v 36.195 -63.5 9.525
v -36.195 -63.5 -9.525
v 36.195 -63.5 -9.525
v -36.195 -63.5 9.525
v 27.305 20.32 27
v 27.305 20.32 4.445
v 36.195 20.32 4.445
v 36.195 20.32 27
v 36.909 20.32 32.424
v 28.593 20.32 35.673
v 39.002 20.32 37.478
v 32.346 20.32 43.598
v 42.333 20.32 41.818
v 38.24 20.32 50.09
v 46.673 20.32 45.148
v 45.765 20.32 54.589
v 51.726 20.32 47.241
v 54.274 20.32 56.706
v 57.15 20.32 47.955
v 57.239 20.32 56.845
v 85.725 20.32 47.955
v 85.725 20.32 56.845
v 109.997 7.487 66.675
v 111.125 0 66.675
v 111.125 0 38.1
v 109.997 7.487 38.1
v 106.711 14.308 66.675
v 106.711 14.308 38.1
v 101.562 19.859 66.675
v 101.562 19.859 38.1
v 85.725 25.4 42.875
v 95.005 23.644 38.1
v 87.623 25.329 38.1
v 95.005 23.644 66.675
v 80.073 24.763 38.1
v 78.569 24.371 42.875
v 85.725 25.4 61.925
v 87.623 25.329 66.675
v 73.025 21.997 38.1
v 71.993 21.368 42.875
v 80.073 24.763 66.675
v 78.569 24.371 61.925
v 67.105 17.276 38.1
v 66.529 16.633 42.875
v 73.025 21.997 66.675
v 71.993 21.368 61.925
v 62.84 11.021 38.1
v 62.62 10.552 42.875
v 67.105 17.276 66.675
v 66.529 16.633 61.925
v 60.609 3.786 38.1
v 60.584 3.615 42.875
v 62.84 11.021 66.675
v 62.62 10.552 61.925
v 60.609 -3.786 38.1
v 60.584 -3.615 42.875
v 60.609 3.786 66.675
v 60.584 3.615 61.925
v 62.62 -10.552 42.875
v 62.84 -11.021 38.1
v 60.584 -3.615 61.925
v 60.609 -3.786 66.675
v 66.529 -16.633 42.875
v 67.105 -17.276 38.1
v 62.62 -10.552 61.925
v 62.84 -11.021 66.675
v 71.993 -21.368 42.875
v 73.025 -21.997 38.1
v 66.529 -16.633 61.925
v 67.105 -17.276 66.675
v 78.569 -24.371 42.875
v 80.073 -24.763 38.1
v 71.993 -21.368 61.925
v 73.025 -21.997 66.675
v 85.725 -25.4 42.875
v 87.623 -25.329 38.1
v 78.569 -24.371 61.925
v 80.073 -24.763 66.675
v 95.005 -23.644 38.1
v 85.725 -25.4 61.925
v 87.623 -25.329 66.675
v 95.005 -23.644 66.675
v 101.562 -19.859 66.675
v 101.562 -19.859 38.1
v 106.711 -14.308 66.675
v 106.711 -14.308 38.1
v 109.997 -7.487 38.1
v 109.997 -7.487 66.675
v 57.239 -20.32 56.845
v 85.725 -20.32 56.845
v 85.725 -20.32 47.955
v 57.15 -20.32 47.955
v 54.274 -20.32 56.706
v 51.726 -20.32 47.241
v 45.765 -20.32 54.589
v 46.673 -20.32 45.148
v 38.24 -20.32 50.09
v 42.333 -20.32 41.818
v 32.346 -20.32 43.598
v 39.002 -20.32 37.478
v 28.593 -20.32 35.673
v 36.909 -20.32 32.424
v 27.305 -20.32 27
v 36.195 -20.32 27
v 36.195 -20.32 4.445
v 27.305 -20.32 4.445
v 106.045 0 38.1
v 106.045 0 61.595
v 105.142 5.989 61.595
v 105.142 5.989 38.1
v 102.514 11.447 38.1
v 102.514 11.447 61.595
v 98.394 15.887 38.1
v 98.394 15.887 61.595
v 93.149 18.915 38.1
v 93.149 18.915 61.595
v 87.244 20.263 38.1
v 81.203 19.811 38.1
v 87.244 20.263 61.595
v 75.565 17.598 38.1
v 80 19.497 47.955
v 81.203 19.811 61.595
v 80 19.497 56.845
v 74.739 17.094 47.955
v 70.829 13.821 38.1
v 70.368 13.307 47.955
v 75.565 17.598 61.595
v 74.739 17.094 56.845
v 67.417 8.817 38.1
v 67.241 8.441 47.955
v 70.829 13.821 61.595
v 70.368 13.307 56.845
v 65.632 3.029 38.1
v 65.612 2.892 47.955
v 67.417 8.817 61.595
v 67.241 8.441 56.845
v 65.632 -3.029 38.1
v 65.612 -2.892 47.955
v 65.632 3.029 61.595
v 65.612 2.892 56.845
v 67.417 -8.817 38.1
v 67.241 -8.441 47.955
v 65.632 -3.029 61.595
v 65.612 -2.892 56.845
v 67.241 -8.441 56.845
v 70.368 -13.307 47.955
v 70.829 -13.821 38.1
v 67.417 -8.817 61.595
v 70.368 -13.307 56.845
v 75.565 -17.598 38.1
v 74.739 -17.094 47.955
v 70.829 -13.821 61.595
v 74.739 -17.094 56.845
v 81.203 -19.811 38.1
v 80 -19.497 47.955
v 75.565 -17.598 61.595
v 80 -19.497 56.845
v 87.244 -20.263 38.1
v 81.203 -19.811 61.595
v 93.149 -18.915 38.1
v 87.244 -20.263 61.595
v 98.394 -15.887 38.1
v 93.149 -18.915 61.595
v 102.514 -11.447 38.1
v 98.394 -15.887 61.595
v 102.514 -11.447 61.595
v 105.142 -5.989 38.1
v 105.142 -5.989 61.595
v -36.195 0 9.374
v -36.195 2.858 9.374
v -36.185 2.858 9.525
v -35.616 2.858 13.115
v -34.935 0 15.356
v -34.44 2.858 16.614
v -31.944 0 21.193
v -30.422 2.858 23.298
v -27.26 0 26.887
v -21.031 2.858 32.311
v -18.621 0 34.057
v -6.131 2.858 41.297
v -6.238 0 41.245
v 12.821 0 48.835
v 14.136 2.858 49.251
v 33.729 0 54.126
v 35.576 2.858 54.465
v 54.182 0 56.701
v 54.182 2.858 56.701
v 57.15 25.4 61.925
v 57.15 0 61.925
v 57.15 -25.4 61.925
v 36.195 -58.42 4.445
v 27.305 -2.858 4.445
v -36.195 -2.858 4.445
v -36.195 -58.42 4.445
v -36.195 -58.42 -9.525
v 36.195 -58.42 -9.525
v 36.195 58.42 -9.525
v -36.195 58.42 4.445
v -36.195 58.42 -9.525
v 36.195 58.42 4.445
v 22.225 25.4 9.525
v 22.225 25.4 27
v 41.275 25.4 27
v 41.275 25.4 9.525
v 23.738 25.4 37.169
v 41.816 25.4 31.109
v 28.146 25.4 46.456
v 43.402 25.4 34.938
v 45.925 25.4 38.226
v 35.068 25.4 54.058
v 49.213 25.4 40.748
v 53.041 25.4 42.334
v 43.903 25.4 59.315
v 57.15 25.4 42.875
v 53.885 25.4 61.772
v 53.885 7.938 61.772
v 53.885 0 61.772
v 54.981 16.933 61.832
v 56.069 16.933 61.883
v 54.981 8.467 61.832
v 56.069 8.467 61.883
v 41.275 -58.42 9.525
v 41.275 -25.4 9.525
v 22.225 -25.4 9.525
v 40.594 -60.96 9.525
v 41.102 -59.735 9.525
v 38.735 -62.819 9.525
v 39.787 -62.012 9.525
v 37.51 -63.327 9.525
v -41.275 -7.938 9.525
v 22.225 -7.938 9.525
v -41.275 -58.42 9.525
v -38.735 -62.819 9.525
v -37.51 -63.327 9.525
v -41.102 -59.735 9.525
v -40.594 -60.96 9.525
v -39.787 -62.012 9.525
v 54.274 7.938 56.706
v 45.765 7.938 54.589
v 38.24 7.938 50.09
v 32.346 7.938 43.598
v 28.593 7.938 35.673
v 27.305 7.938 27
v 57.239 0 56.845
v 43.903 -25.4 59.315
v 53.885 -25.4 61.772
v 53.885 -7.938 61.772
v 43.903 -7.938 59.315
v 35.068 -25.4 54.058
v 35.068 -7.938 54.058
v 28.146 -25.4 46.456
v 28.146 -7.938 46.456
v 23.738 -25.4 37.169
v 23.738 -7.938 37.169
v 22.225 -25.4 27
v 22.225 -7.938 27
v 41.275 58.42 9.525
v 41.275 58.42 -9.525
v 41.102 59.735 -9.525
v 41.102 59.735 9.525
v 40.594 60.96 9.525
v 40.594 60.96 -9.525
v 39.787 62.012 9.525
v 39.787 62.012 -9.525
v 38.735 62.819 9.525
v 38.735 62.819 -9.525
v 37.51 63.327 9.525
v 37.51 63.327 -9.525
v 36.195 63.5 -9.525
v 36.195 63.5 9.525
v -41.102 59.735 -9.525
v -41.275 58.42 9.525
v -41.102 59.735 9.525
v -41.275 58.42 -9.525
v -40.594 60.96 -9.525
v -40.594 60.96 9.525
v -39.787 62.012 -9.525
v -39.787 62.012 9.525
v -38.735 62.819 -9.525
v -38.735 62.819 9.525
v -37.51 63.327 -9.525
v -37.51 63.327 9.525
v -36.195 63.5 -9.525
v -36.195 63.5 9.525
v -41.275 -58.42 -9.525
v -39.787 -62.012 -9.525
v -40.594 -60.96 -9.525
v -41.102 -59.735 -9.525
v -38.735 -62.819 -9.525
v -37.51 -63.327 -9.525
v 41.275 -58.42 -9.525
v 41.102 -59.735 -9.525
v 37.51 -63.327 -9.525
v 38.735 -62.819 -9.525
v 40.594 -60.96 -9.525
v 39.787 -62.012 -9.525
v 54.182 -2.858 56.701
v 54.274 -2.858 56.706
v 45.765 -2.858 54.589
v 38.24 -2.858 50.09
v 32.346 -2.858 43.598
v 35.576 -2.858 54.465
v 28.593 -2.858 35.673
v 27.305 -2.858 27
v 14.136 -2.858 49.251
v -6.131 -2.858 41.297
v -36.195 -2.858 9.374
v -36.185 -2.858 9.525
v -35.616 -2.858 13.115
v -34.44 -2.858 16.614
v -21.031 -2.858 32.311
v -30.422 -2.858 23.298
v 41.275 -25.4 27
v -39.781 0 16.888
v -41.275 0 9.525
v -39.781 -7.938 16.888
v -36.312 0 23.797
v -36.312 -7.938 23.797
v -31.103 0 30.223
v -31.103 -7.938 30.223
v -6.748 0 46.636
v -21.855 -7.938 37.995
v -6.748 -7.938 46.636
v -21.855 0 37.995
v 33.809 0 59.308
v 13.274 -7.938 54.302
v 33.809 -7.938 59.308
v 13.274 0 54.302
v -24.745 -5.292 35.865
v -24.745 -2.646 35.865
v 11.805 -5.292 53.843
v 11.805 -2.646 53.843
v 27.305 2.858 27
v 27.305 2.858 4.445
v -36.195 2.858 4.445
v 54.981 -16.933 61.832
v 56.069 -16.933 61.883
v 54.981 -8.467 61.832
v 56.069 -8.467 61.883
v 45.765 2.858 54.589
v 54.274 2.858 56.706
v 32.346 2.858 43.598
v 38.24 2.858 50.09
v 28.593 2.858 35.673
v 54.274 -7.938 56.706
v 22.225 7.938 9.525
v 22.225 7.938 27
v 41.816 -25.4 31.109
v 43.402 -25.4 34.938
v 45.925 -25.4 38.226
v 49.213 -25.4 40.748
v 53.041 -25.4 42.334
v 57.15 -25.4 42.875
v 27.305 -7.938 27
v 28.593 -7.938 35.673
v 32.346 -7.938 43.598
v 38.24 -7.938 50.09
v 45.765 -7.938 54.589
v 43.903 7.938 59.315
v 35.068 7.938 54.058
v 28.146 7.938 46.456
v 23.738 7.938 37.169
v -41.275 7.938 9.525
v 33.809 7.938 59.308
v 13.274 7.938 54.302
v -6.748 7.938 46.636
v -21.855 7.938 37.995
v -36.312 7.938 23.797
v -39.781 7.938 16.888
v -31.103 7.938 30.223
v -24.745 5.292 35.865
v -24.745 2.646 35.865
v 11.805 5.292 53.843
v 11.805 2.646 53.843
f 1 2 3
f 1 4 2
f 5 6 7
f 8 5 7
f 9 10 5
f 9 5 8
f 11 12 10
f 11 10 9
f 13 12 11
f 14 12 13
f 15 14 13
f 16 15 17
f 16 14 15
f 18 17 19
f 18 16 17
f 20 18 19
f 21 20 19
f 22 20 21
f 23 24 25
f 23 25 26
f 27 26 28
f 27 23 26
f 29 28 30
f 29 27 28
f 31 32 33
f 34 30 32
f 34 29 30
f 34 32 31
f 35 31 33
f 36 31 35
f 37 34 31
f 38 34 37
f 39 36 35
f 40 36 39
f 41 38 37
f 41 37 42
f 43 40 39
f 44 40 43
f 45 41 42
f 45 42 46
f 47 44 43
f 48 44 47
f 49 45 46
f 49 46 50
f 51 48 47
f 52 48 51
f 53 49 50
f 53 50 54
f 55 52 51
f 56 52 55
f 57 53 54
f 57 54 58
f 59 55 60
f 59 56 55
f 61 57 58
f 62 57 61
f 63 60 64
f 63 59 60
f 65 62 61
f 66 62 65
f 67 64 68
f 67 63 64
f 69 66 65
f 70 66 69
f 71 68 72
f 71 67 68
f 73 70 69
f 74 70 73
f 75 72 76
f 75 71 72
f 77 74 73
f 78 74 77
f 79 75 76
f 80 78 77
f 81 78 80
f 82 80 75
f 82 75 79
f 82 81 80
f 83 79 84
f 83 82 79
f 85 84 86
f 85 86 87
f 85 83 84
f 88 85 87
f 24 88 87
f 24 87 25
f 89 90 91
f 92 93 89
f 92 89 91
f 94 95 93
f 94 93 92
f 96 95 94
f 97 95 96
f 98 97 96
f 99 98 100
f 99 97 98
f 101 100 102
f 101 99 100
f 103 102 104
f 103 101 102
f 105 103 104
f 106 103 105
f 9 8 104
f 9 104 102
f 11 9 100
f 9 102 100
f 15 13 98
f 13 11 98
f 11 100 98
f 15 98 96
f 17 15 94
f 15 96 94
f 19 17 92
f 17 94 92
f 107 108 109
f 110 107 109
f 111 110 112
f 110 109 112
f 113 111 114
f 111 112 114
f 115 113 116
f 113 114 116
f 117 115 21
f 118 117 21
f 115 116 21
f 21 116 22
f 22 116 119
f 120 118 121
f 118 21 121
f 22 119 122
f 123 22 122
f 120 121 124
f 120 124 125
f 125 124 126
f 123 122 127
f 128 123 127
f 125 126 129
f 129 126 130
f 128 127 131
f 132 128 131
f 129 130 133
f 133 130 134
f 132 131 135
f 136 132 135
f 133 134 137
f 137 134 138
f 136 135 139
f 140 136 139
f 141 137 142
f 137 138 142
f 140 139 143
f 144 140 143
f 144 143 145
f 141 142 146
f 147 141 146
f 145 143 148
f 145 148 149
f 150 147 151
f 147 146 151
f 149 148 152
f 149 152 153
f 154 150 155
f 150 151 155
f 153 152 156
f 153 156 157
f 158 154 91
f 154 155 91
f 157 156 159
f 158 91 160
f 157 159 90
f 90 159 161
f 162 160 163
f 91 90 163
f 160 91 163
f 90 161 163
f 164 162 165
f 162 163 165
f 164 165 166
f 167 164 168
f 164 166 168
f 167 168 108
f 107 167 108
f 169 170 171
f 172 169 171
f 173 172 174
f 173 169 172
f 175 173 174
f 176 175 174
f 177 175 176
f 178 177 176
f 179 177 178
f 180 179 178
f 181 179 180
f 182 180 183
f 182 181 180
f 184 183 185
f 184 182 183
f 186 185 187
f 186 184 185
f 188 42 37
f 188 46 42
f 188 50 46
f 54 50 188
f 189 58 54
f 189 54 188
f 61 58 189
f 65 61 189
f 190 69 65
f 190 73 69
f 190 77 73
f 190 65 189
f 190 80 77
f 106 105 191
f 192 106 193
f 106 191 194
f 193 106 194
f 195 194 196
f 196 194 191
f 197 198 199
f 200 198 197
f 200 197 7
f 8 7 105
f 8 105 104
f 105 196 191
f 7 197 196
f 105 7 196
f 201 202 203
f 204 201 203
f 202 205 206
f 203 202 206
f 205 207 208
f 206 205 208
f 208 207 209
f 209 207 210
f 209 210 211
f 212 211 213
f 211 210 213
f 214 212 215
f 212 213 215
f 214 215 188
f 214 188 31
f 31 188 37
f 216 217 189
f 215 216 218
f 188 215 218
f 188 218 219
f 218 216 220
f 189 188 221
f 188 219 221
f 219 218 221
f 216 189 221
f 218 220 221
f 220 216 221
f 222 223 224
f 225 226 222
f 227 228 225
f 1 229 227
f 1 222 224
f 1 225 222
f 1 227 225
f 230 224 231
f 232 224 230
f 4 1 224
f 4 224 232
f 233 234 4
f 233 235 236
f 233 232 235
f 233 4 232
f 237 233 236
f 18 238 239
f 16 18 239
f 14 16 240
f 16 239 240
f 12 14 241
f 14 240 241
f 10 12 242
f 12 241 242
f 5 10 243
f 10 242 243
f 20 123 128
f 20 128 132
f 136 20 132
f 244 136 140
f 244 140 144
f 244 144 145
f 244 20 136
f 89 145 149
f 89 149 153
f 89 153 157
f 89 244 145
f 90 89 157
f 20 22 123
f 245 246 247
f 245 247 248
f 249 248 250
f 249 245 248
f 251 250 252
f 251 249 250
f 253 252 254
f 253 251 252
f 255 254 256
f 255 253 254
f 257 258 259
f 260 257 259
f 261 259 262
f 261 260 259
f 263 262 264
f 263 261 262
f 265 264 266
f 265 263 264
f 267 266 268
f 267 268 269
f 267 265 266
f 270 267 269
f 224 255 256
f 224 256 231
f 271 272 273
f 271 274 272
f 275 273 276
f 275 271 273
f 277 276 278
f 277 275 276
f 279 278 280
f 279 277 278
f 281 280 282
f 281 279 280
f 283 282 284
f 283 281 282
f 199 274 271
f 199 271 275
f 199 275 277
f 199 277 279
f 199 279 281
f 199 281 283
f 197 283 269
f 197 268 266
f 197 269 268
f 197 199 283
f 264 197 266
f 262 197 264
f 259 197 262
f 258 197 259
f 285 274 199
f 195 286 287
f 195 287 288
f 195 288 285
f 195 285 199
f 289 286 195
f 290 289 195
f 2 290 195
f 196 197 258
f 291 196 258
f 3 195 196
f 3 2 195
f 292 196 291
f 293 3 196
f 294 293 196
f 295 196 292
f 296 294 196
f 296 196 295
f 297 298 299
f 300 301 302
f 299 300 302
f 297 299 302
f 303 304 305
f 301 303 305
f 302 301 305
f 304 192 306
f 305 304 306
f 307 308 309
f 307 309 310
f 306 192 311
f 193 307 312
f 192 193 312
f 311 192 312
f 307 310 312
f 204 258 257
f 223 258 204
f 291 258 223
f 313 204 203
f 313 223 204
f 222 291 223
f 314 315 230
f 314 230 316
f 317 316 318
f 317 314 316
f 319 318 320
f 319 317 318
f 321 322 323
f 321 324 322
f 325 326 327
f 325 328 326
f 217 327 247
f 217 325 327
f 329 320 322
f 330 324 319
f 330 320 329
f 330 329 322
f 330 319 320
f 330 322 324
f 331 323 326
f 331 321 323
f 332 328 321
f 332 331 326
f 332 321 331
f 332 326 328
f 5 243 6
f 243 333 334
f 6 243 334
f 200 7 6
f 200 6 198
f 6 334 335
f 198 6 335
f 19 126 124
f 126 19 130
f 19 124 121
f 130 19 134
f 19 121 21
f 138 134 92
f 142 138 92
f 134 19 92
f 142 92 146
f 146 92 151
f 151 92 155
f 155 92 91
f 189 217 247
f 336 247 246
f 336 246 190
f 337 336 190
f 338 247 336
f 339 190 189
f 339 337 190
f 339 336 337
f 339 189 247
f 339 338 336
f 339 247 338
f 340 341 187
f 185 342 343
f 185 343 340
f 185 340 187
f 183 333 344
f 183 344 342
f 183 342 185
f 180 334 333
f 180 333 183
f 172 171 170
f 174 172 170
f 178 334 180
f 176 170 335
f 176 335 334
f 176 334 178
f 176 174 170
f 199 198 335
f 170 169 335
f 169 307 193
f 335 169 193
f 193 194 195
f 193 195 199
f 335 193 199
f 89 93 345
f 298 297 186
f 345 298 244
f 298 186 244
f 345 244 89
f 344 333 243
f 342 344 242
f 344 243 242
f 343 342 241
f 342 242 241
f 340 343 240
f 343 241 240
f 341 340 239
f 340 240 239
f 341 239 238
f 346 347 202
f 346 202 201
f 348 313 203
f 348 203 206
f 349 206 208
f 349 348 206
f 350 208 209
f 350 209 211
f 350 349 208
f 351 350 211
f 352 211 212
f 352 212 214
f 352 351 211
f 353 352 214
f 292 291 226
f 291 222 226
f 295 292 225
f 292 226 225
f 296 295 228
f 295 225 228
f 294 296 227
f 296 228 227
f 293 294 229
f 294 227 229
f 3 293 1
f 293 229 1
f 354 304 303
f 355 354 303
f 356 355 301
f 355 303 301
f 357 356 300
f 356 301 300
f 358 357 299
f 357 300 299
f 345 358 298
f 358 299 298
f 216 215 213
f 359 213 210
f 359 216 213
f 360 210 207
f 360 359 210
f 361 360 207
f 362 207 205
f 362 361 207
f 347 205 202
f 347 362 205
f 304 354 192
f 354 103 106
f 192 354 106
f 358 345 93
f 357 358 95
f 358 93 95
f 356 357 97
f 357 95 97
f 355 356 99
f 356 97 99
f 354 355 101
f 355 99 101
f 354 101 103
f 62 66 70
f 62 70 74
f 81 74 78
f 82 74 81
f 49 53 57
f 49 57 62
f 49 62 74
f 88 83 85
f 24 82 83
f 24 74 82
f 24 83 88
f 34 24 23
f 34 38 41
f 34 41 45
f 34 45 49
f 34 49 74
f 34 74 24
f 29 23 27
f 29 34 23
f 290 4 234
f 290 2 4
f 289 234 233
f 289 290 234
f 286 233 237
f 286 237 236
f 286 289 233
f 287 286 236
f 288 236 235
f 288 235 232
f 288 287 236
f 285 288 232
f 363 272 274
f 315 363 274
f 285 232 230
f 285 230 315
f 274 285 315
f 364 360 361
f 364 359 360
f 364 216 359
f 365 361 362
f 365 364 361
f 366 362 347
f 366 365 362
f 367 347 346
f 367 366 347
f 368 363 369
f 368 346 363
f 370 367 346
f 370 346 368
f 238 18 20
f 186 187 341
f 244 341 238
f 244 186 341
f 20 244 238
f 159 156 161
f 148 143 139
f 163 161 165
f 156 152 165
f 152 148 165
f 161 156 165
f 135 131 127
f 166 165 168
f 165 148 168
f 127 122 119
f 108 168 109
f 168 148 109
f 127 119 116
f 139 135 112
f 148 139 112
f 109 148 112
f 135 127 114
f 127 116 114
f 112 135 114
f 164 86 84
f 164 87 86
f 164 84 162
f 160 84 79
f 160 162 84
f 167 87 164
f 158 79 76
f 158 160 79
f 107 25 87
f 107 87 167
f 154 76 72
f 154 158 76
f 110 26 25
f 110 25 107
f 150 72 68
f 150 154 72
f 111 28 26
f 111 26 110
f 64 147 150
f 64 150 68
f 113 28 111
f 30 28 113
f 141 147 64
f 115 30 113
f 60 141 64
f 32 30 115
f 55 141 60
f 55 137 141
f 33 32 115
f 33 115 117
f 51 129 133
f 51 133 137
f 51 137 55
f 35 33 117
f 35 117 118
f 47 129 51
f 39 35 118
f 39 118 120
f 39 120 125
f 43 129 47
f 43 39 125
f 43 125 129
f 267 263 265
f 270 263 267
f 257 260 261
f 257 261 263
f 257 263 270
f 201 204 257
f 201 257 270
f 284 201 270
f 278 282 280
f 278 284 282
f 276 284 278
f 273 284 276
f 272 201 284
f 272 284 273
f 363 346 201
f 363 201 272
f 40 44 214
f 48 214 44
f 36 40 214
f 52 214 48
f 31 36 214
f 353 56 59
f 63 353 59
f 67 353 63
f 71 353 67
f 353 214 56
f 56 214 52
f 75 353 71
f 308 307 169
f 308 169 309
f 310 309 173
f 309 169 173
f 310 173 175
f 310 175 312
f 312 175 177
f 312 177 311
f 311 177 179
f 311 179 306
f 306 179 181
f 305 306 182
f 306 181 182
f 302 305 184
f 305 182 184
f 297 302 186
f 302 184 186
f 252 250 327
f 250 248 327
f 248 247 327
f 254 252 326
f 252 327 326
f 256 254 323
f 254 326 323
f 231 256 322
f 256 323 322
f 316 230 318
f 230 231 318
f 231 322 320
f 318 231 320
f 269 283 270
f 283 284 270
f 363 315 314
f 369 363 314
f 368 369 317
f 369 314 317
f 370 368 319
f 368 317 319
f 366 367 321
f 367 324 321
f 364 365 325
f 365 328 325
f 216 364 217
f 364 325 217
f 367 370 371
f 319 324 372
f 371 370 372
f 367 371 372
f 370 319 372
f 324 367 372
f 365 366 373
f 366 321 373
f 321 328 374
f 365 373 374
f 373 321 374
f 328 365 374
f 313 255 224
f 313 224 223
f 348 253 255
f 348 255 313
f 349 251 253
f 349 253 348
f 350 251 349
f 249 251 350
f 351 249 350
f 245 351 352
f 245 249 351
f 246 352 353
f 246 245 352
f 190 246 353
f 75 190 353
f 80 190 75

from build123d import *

# Parameters (mm, degrees)
F1_DEPTH     = 63.5
F0_W         = 25.4
F0_H         = 19.05
F2_DEPTH     = 25.4
F3_DEPTH     = 7.9375
F5_R         = 5.08
F6_T         = 5.08
F6_T3_DEPTH  = 29.21
F6_T5_DEPTH  = 27.6225
F6_T7_DEPTH  = 73.66
F6_T9_DEPTH  = 27.6352
F6_T11_DEPTH = 27.6225
F6_T14_ANGLE = 84.6365269518
F6_T16_ANGLE = 180.000000001
F6_T18_ANGLE = 180.000000001
F6_T20_ANGLE = 84.6365269518


# Not quite as in the source:
# - a shell that OpenCascade refuses in one call is made with other operations: the cavity is built on its own and cut out


with BuildPart() as f1:
    # F0 (on Front) → F1 (new body, symmetric)
    with BuildSketch(Plane.XZ):
        Polygon((22.225, 9.525), (-41.275, 9.525), (-41.275, -9.525), (41.275, -9.525), (41.275, 9.525), align=None)
    extrude(amount=F1_DEPTH, both=True)

    # F0 (on Front) → F2 (join, symmetric)
    with BuildSketch(Plane.XZ):
        with BuildLine():
            Line((22.225, 27.0002), (22.225, 9.525))
            Line((22.225, 9.525), (41.275, 9.525))
            Line((41.275, 9.525), (41.275, 27.0002))
            ThreePointArc((41.275, 27.0002), (45.9246798487, 38.2255201513), (57.15, 42.8752))
            Line((57.15, 42.8752), (60.325, 42.8752))
            Line((60.325, 42.8752), (60.325, 61.9252))
            Line((60.325, 61.9252), (57.15, 61.9252))
            add(Edge.make_bspline(
                [(53.8854342407, 61.7722898912), (54.9842067368, 61.8365871986), (56.0728453275, 61.8876096574), (57.15, 61.9252)],
                knots=[108.5245810491, 108.5245810491, 108.5245810491, 108.5245810491, 111.5045361635, 111.5045361635, 111.5045361635, 111.5045361635], degree=3))
            ThreePointArc((53.8854342407, 61.7722898912), (31.3258777096, 50.5133948686), (22.225, 27.0002))
        make_face()
        with Locations((73.025, 52.4002)):
            Rectangle(F0_W, F0_H)
    extrude(amount=F2_DEPTH, both=True)

    # F0 (on Front) → F3 (join, symmetric)
    with BuildSketch(Plane.XZ):
        with BuildLine():
            add(Edge.make_bspline(
                [(-41.275, 9.525), (-39.5856284224, 39.4828766469), (13.870125209, 59.4306981306), (53.8854342407, 61.7722898912)],
                knots=[0, 0, 0, 0, 108.5245810491, 108.5245810491, 108.5245810491, 108.5245810491], degree=3))
            Line((-41.275, 9.525), (22.225, 9.525))
            Line((22.225, 9.525), (22.225, 27.0002))
            ThreePointArc((22.225, 27.0002), (31.3258777096, 50.5133948686), (53.8854342407, 61.7722898912))
        make_face()
    extrude(amount=F3_DEPTH, both=True)

    # F0 (on Front) → F4 (revolve)
    with BuildSketch(Plane.XZ):
        Polygon((85.725, 66.675), (85.725, 61.9252), (85.725, 42.8752), (85.725, 38.1), (111.125, 38.1), (111.125, 66.675), align=None)
    revolve(axis=Axis((85.725, 0, 52.3875), (0, 0, 1)))

    # F5
    f5_edges = [f1.edges().sort_by_distance(p)[0] for p in [
        (41.275, -63.5, 0),
        (-41.275, -63.5, 0),
        (41.275, 63.5, 0),
        (-41.275, 63.5, 0),
    ]]
    fillet(f5_edges, radius=F5_R)

    # F6: shell of thickness 5.08, made by hand


with BuildPart() as f6_core1:
    # F6_t2: copy of F1
    add(f1.part)

    # the walls: a layer under each face that stays
    f6_faces = [f6_core1.faces().sort_by_distance(p)[0] for p in [
        (0, 35.71875, 9.525),
        (41.275, 0, 8.7376),
        (32.8083333333, 25.4, 18.2583666667),
        (0, 63.5, 0),
        (22.225, 16.66875, 18.2626),
        (6.3052171204, 7.9375, 35.6486449456),
        (-41.275, 0, 0),
        (45.9246798487, 0, 38.2255201513),
        (32.8083333333, -25.4, 18.2583666667),
        (0, -35.71875, 9.525),
        (31.3258777096, 16.66875, 50.5133948686),
        (61.9125, 16.9333333333, 42.8752),
        (98.425, 21.9970452561, 42.8625),
        (61.9125, 16.9333333333, 61.9252),
        (55.5258238042, 12.7, 61.8587600574),
        (-8.0670094249, 3.96875, 46.0047517779),
        (-8.0670094249, -3.96875, 46.0047517779),
        (0, -63.5, 0),
        (31.3258777096, -16.66875, 50.5133948686),
        (22.225, -16.66875, 18.2626),
        (55.5258238042, -12.7, 61.8587600574),
        (6.3052171204, -7.9375, 35.6486449456),
        (85.725, 0, 66.675),
    ]]
    thicken(f6_faces, amount=-F6_T, mode=Mode.SUBTRACT)

    # F6_s4 → F6_t3 (cut)
    with BuildSketch(Plane.YZ.offset(17.145)):
        Polygon((25.4508, 9.5758), (25.4, 4.445), (20.32, 4.445), (20.32, 9.525), align=None)
        Polygon((-25.4508, 9.5758), (-20.32, 9.525), (-20.32, 4.445), (-25.4, 4.445), align=None)
    extrude(amount=F6_T3_DEPTH, mode=Mode.SUBTRACT)

    # F6_s6 → F6_t5 (cut)
    with BuildSketch(Plane.XZ.offset(-30.48)):
        Polygon((22.1742, 9.5758), (22.225, 4.445), (27.305, 4.445), (27.305, 9.525), align=None)
    extrude(amount=F6_T5_DEPTH, mode=Mode.SUBTRACT)

    # F6_s8 → F6_t7 (cut)
    with BuildSketch(Plane.YZ.offset(-46.355)):
        Polygon((7.9883, 9.5758), (7.9375, 4.445), (2.8575, 4.445), (2.8575, 9.525), align=None)
        Polygon((-7.9883, 9.5758), (-7.9375, 4.445), (-2.8575, 4.445), (-2.8575, 9.525), align=None)
    extrude(amount=F6_T7_DEPTH, mode=Mode.SUBTRACT)

    # F6_s10 → F6_t9 (cut)
    with BuildSketch(Plane.XY.offset(4.445)):
        Polygon((22.1742, 7.9883), (27.305, 7.9375), (27.305, 2.8575), (22.225, 2.8575), align=None)
        Polygon((22.1742, -7.9883), (27.305, -7.9375), (27.305, -2.8575), (22.225, -2.8575), align=None)
    extrude(amount=F6_T9_DEPTH, mode=Mode.SUBTRACT)

    # F6_s12 → F6_t11 (cut)
    with BuildSketch(Plane.XZ.offset(2.8575)):
        Polygon((22.1742, 9.5758), (22.225, 4.445), (27.305, 4.445), (27.305, 9.525), align=None)
    extrude(amount=F6_T11_DEPTH, mode=Mode.SUBTRACT)

    # F6_s13 → F6_t14 (revolve, cut)
    with BuildSketch(Plane.XY.offset(27.0002)):
        Polygon((22.1742, 7.9883), (22.225, 2.8575), (27.305, 2.8575), (27.305, 7.9375), align=None)
    revolve(axis=Axis((57.15, 7.9375, 27.0002), (0, 1, 0)), revolution_arc=F6_T14_ANGLE, mode=Mode.SUBTRACT)

    # F6_s15 → F6_t16 (revolve, cut)
    with BuildSketch(Plane.YZ.offset(85.725)):
        Polygon((25.4508, 42.8244), (25.4, 47.9552), (20.32, 47.9552), (20.32, 42.8752), align=None)
    revolve(axis=Axis((85.725, 0, 42.8752), (0, 0, 1)), revolution_arc=F6_T16_ANGLE, mode=Mode.SUBTRACT)

    # F6_s17 → F6_t18 (revolve, cut)
    with BuildSketch(Plane.YZ.offset(85.725)):
        Polygon((25.4508, 61.976), (20.32, 61.9252), (20.32, 56.8452), (25.4, 56.8452), align=None)
    revolve(axis=Axis((85.725, 0, 61.9252), (0, 0, 1)), revolution_arc=F6_T18_ANGLE, mode=Mode.SUBTRACT)

    # F6_s19 → F6_t20 (revolve, cut)
    with BuildSketch(Plane.XY.offset(27.0002)):
        Polygon((22.1742, -7.9883), (27.305, -7.9375), (27.305, -2.8575), (22.225, -2.8575), align=None)
    revolve(axis=Axis((57.15, -7.9375, 27.0002), (0, 1, 0)), revolution_arc=F6_T20_ANGLE, mode=Mode.SUBTRACT)


with BuildPart() as f1_1:
    add(f1.part)

    # what is left inside the walls is the cavity
    f6_cavity = [f6_core1.part.solids().sort_by_distance(p)[0] for p in [
        (0, 19.473333, -9.4742),
    ]]
    add(f6_cavity, mode=Mode.SUBTRACT)


solid = f1_1.part
